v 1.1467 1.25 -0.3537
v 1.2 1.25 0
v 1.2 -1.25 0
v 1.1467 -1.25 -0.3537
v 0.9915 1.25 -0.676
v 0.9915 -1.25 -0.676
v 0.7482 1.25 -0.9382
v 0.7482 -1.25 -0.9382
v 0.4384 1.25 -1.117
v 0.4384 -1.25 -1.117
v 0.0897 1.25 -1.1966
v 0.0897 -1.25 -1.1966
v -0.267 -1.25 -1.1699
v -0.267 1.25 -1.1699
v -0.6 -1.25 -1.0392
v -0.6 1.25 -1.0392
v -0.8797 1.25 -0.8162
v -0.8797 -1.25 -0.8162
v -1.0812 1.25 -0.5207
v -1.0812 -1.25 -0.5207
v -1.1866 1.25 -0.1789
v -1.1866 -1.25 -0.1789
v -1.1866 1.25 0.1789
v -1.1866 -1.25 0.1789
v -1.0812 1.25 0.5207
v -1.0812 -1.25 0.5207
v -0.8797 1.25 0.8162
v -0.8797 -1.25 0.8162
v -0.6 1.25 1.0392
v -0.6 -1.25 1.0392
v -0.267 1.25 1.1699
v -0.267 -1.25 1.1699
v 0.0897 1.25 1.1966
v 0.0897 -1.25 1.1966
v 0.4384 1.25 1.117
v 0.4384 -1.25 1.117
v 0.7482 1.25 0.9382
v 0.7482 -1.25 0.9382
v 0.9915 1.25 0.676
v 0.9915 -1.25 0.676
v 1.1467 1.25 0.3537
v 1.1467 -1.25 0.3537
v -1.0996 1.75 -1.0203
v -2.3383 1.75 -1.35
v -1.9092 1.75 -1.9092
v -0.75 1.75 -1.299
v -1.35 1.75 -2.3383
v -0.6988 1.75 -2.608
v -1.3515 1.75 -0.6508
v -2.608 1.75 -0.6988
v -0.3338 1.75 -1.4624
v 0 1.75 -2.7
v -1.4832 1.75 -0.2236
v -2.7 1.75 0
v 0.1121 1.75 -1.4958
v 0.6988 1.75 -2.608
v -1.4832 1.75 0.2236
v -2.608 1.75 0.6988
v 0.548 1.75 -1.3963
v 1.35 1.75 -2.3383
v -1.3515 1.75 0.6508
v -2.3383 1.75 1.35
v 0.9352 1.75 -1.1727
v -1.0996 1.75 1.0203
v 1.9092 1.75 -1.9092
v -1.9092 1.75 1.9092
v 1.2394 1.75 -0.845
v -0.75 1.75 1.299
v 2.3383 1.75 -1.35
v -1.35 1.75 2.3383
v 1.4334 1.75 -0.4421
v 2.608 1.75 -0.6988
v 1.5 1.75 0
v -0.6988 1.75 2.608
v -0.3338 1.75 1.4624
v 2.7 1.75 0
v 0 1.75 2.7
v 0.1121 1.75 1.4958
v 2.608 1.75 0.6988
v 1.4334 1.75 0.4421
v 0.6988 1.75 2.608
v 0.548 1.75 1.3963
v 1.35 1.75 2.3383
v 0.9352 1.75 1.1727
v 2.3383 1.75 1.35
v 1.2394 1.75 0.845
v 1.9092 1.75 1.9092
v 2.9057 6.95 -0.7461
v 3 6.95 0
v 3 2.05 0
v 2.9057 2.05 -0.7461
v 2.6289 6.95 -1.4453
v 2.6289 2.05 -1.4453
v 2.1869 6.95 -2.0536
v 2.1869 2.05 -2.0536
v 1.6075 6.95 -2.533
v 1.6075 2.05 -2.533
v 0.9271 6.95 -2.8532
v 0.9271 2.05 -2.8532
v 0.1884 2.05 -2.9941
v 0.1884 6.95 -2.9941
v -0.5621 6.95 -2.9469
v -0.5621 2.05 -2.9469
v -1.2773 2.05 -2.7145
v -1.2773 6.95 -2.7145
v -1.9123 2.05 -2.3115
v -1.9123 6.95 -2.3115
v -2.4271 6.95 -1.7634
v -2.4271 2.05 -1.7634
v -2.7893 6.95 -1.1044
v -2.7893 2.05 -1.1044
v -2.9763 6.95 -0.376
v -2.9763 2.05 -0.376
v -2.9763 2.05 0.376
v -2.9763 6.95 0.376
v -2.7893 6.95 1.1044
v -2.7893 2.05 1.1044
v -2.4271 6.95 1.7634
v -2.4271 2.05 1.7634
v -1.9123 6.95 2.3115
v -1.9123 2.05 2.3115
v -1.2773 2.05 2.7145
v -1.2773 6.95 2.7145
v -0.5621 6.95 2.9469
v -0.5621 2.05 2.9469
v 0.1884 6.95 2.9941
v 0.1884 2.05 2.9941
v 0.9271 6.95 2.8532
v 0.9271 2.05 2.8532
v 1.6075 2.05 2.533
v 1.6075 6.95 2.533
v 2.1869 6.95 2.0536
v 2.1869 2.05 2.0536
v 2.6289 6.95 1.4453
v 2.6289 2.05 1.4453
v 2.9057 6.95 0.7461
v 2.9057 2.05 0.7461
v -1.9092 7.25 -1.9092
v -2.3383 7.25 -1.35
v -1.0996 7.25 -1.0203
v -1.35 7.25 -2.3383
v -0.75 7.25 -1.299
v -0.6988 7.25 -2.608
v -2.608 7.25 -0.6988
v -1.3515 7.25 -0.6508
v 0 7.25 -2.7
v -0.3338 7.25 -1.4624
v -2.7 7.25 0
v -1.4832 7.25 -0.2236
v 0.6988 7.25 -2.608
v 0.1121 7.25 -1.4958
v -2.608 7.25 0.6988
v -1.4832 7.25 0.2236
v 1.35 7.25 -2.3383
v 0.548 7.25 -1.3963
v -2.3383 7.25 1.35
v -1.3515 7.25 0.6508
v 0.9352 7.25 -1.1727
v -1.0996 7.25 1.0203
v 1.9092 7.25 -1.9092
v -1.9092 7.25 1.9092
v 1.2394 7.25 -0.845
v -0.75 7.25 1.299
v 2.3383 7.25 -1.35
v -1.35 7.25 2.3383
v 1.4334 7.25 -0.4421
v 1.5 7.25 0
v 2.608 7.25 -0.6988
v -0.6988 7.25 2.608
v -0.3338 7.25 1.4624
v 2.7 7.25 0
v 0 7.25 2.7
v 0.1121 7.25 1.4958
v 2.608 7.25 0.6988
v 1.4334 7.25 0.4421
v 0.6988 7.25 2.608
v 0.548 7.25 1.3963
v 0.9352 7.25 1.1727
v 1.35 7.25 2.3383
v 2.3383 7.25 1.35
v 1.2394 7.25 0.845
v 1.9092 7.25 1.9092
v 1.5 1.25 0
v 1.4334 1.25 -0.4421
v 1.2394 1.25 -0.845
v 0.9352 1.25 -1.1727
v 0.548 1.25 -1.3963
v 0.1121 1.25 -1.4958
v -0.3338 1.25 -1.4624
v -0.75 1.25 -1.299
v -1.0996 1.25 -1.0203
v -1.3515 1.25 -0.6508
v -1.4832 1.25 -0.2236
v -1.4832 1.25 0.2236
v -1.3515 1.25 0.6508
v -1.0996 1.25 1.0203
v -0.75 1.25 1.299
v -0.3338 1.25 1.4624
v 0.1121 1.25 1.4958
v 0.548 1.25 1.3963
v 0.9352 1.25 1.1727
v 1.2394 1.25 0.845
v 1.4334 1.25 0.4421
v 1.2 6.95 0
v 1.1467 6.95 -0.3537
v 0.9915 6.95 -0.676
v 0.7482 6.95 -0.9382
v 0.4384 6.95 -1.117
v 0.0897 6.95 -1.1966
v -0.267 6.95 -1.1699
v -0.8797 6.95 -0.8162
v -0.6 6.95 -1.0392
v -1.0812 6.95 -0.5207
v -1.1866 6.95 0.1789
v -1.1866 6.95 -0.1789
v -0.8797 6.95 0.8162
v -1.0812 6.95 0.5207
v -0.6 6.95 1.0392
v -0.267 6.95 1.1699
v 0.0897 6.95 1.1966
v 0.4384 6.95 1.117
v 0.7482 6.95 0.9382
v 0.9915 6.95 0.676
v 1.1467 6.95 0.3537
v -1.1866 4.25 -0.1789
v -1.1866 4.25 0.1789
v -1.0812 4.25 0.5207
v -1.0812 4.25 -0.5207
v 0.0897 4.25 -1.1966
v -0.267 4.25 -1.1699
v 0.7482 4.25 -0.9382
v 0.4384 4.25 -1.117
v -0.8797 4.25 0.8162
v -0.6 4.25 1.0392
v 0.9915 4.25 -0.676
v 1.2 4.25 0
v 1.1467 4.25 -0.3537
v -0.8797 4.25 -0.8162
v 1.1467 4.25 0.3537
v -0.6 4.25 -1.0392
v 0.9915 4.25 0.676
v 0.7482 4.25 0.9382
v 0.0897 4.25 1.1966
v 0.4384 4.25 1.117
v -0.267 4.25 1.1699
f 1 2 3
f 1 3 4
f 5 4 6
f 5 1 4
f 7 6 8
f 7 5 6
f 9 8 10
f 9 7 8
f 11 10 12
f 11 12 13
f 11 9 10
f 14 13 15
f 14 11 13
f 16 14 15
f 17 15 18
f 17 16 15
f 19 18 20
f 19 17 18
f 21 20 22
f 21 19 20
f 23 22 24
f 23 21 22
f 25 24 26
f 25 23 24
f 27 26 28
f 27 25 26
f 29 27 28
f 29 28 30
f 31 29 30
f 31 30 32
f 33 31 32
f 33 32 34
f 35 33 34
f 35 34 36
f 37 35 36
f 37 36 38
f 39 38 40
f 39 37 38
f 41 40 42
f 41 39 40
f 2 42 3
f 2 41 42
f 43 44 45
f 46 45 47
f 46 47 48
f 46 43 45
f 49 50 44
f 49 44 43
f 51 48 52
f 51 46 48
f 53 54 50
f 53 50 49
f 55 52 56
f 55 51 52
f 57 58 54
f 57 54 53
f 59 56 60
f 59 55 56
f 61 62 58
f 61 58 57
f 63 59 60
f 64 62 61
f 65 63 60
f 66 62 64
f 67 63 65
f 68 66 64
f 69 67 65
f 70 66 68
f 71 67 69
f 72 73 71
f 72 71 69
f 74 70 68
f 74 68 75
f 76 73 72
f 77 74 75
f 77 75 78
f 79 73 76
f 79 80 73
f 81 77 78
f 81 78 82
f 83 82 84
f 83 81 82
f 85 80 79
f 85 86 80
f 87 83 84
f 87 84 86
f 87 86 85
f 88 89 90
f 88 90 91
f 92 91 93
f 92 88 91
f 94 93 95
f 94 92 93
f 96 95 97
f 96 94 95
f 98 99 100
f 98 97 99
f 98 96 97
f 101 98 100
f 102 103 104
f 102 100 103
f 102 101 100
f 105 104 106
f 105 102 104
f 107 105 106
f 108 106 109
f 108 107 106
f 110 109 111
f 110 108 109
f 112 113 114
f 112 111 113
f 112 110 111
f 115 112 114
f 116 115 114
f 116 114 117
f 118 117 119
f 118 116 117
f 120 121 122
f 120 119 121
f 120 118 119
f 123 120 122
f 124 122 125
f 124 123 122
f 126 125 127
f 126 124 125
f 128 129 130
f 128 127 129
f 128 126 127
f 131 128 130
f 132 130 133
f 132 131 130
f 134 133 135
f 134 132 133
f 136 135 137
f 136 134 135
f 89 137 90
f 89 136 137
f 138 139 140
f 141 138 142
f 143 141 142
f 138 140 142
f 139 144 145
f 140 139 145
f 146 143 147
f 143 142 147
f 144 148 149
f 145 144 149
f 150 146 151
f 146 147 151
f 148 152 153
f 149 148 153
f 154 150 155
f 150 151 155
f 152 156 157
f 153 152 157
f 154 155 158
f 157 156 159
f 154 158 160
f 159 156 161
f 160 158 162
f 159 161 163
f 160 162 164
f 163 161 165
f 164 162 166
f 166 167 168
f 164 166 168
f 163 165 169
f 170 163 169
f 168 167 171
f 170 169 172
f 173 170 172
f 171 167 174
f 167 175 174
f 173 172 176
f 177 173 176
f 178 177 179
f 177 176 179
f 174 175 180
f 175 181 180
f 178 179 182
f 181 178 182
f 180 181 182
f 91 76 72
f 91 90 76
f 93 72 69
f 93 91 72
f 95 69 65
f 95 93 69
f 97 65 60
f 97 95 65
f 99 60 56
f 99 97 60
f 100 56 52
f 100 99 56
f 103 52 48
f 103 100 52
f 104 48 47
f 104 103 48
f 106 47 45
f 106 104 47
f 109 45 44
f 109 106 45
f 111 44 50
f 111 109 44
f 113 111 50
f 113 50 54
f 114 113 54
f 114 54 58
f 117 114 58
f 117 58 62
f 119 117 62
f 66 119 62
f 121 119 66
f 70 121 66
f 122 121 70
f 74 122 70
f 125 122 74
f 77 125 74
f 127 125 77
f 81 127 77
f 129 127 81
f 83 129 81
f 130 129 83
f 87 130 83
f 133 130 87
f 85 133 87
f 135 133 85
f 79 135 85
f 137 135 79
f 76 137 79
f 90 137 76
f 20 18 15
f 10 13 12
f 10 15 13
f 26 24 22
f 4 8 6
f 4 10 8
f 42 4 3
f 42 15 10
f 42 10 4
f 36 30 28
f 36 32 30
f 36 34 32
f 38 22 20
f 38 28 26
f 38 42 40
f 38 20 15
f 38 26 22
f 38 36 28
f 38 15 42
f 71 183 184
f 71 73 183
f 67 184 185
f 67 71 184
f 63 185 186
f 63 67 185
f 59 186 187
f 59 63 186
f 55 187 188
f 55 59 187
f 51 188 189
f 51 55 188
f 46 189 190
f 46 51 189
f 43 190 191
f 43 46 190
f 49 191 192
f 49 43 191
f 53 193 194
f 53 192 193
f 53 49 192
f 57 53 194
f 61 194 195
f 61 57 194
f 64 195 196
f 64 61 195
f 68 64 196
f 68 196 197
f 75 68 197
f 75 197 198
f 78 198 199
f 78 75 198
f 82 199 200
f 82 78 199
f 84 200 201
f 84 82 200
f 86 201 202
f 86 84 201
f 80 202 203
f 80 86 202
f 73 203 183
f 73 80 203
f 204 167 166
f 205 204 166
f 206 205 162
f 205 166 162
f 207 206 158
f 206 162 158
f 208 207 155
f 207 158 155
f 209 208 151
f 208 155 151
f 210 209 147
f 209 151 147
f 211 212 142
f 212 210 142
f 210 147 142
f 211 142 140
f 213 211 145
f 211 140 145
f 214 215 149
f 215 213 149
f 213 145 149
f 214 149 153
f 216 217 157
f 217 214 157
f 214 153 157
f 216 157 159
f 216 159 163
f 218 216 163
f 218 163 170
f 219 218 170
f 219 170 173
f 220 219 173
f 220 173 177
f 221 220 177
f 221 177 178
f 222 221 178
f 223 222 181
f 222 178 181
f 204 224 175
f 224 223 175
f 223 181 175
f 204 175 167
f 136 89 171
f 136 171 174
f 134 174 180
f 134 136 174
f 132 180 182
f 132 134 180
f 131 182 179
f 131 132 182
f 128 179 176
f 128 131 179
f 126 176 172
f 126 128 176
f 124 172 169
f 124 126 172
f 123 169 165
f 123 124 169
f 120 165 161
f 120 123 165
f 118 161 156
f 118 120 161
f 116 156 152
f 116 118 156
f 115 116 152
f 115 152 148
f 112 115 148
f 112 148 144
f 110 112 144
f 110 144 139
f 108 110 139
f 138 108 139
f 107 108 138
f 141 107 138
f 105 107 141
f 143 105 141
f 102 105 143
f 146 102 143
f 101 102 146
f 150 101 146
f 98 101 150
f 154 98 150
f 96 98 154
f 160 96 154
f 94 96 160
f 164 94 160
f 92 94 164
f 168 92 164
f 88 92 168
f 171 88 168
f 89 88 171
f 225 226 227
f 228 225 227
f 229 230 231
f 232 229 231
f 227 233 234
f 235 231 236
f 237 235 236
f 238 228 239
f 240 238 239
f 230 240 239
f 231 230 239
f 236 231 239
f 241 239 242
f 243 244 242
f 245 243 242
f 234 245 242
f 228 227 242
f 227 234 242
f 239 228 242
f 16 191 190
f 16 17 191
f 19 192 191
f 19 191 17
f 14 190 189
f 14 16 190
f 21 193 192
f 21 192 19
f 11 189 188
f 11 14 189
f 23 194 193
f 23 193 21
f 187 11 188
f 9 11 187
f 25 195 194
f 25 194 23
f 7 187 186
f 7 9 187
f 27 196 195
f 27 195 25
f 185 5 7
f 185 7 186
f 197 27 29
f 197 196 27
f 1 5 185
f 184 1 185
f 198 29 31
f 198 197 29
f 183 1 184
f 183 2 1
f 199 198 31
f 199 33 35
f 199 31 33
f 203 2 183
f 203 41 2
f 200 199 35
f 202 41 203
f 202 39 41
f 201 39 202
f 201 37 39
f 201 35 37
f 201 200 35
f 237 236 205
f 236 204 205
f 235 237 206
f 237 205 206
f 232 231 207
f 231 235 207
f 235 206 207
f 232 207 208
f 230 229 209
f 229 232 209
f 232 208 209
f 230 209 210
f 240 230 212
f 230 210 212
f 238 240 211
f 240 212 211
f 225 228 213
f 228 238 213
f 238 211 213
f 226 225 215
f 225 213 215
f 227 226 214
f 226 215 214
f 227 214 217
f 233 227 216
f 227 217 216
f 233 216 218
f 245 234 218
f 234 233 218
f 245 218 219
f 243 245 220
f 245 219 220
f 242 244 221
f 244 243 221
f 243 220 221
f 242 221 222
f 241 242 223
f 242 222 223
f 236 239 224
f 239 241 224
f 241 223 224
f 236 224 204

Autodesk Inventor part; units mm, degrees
ref_plane "YZ Plane" through (0, 0, 0) normal (1, 0, 0) x (0, 1, 0)
ref_plane "XZ Plane" through (0, 0, 0) normal (0, 1, 0) x (-1, 0, 0)
ref_plane "XY Plane" through (0, 0, 0) normal (0, 0, 1) x (1, 0, 0)
sketch "スケッチ1" plane through (0, 0, 0) normal (0, 0, 1) x (1, 0, 0)
  line L0 (0, -4.25) -> (0.9, -4.25)
  line L1 (0.9, -4.25) -> (1.2, -3.95)
  line L2 (1.2, -3.95) -> (1.2, 1.25)
  line L3 (1.2, 1.25) -> (1.5, 1.25)
  line L4 (1.5, 1.25) -> (1.5, 1.75)
  line L5 (1.5, 1.75) -> (2.7, 1.75)
  line L6 (3, 6.95) -> (2.7, 7.25)
  line L7 (2.7, 7.25) -> (1.5, 7.25)
  line L8 (1.5, 7.25) -> (1.2, 6.95)
  line L9 (0, 7.4044) -> (0, -7.4044) construction
  line L10 (0, -4.25) -> (0, 4.25)
  line L11 (0, 4.25) -> (1.2, 4.25)
  line L12 (1.2, 4.25) -> (1.2, 6.95)
  line L13 (2.7, 1.75) -> (3, 2.05)
  line L14 (3, 2.05) -> (3, 6.95)
  point P0 (0, 0)
  point P1 (0, 0)
  dimension "d0" = 2.4
  dimension "d1" = 6
  dimension "d2" = 0.3
  dimension "d3" = 0.3
  dimension "d4" = 3
  dimension "d5" = 0.5
  dimension "d6" = 5.5
  dimension "d8" = 0.3
  dimension "d9" = 2.4
  dimension "d10" = 3
  dimension "d11" = 0.3
  dimension "d12" = 0.3
  dimension "d13" = 0.3
  dimension "d14" = 0.3
  dimension "d15" = 6
revolve "回転1" add sketch "スケッチ1" angle 360 about axis through (0, 7.4044, 0) along (0, -1, 0)
sketch "スケッチ3" plane through (0, -4.25, 0) normal (0, -1, 0) x (1, 0, 0)
  circle A0 centre (0, 0) radius 0.9 projected
  circle A1 centre (0, 0) radius 4.1426
extrude "押し出し2" cut sketch "スケッチ3" against normal blind 3 contours A0 | A1
equation "\"d3\" = d2"
equation "\"d11\" = d8"
equation "\"d12\" = d8"
equation "\"d13\" = d12"
equation "\"d14\" = d13"
properties part number "BRU-305_5" material "ステンレス鋼 AISI 304"
